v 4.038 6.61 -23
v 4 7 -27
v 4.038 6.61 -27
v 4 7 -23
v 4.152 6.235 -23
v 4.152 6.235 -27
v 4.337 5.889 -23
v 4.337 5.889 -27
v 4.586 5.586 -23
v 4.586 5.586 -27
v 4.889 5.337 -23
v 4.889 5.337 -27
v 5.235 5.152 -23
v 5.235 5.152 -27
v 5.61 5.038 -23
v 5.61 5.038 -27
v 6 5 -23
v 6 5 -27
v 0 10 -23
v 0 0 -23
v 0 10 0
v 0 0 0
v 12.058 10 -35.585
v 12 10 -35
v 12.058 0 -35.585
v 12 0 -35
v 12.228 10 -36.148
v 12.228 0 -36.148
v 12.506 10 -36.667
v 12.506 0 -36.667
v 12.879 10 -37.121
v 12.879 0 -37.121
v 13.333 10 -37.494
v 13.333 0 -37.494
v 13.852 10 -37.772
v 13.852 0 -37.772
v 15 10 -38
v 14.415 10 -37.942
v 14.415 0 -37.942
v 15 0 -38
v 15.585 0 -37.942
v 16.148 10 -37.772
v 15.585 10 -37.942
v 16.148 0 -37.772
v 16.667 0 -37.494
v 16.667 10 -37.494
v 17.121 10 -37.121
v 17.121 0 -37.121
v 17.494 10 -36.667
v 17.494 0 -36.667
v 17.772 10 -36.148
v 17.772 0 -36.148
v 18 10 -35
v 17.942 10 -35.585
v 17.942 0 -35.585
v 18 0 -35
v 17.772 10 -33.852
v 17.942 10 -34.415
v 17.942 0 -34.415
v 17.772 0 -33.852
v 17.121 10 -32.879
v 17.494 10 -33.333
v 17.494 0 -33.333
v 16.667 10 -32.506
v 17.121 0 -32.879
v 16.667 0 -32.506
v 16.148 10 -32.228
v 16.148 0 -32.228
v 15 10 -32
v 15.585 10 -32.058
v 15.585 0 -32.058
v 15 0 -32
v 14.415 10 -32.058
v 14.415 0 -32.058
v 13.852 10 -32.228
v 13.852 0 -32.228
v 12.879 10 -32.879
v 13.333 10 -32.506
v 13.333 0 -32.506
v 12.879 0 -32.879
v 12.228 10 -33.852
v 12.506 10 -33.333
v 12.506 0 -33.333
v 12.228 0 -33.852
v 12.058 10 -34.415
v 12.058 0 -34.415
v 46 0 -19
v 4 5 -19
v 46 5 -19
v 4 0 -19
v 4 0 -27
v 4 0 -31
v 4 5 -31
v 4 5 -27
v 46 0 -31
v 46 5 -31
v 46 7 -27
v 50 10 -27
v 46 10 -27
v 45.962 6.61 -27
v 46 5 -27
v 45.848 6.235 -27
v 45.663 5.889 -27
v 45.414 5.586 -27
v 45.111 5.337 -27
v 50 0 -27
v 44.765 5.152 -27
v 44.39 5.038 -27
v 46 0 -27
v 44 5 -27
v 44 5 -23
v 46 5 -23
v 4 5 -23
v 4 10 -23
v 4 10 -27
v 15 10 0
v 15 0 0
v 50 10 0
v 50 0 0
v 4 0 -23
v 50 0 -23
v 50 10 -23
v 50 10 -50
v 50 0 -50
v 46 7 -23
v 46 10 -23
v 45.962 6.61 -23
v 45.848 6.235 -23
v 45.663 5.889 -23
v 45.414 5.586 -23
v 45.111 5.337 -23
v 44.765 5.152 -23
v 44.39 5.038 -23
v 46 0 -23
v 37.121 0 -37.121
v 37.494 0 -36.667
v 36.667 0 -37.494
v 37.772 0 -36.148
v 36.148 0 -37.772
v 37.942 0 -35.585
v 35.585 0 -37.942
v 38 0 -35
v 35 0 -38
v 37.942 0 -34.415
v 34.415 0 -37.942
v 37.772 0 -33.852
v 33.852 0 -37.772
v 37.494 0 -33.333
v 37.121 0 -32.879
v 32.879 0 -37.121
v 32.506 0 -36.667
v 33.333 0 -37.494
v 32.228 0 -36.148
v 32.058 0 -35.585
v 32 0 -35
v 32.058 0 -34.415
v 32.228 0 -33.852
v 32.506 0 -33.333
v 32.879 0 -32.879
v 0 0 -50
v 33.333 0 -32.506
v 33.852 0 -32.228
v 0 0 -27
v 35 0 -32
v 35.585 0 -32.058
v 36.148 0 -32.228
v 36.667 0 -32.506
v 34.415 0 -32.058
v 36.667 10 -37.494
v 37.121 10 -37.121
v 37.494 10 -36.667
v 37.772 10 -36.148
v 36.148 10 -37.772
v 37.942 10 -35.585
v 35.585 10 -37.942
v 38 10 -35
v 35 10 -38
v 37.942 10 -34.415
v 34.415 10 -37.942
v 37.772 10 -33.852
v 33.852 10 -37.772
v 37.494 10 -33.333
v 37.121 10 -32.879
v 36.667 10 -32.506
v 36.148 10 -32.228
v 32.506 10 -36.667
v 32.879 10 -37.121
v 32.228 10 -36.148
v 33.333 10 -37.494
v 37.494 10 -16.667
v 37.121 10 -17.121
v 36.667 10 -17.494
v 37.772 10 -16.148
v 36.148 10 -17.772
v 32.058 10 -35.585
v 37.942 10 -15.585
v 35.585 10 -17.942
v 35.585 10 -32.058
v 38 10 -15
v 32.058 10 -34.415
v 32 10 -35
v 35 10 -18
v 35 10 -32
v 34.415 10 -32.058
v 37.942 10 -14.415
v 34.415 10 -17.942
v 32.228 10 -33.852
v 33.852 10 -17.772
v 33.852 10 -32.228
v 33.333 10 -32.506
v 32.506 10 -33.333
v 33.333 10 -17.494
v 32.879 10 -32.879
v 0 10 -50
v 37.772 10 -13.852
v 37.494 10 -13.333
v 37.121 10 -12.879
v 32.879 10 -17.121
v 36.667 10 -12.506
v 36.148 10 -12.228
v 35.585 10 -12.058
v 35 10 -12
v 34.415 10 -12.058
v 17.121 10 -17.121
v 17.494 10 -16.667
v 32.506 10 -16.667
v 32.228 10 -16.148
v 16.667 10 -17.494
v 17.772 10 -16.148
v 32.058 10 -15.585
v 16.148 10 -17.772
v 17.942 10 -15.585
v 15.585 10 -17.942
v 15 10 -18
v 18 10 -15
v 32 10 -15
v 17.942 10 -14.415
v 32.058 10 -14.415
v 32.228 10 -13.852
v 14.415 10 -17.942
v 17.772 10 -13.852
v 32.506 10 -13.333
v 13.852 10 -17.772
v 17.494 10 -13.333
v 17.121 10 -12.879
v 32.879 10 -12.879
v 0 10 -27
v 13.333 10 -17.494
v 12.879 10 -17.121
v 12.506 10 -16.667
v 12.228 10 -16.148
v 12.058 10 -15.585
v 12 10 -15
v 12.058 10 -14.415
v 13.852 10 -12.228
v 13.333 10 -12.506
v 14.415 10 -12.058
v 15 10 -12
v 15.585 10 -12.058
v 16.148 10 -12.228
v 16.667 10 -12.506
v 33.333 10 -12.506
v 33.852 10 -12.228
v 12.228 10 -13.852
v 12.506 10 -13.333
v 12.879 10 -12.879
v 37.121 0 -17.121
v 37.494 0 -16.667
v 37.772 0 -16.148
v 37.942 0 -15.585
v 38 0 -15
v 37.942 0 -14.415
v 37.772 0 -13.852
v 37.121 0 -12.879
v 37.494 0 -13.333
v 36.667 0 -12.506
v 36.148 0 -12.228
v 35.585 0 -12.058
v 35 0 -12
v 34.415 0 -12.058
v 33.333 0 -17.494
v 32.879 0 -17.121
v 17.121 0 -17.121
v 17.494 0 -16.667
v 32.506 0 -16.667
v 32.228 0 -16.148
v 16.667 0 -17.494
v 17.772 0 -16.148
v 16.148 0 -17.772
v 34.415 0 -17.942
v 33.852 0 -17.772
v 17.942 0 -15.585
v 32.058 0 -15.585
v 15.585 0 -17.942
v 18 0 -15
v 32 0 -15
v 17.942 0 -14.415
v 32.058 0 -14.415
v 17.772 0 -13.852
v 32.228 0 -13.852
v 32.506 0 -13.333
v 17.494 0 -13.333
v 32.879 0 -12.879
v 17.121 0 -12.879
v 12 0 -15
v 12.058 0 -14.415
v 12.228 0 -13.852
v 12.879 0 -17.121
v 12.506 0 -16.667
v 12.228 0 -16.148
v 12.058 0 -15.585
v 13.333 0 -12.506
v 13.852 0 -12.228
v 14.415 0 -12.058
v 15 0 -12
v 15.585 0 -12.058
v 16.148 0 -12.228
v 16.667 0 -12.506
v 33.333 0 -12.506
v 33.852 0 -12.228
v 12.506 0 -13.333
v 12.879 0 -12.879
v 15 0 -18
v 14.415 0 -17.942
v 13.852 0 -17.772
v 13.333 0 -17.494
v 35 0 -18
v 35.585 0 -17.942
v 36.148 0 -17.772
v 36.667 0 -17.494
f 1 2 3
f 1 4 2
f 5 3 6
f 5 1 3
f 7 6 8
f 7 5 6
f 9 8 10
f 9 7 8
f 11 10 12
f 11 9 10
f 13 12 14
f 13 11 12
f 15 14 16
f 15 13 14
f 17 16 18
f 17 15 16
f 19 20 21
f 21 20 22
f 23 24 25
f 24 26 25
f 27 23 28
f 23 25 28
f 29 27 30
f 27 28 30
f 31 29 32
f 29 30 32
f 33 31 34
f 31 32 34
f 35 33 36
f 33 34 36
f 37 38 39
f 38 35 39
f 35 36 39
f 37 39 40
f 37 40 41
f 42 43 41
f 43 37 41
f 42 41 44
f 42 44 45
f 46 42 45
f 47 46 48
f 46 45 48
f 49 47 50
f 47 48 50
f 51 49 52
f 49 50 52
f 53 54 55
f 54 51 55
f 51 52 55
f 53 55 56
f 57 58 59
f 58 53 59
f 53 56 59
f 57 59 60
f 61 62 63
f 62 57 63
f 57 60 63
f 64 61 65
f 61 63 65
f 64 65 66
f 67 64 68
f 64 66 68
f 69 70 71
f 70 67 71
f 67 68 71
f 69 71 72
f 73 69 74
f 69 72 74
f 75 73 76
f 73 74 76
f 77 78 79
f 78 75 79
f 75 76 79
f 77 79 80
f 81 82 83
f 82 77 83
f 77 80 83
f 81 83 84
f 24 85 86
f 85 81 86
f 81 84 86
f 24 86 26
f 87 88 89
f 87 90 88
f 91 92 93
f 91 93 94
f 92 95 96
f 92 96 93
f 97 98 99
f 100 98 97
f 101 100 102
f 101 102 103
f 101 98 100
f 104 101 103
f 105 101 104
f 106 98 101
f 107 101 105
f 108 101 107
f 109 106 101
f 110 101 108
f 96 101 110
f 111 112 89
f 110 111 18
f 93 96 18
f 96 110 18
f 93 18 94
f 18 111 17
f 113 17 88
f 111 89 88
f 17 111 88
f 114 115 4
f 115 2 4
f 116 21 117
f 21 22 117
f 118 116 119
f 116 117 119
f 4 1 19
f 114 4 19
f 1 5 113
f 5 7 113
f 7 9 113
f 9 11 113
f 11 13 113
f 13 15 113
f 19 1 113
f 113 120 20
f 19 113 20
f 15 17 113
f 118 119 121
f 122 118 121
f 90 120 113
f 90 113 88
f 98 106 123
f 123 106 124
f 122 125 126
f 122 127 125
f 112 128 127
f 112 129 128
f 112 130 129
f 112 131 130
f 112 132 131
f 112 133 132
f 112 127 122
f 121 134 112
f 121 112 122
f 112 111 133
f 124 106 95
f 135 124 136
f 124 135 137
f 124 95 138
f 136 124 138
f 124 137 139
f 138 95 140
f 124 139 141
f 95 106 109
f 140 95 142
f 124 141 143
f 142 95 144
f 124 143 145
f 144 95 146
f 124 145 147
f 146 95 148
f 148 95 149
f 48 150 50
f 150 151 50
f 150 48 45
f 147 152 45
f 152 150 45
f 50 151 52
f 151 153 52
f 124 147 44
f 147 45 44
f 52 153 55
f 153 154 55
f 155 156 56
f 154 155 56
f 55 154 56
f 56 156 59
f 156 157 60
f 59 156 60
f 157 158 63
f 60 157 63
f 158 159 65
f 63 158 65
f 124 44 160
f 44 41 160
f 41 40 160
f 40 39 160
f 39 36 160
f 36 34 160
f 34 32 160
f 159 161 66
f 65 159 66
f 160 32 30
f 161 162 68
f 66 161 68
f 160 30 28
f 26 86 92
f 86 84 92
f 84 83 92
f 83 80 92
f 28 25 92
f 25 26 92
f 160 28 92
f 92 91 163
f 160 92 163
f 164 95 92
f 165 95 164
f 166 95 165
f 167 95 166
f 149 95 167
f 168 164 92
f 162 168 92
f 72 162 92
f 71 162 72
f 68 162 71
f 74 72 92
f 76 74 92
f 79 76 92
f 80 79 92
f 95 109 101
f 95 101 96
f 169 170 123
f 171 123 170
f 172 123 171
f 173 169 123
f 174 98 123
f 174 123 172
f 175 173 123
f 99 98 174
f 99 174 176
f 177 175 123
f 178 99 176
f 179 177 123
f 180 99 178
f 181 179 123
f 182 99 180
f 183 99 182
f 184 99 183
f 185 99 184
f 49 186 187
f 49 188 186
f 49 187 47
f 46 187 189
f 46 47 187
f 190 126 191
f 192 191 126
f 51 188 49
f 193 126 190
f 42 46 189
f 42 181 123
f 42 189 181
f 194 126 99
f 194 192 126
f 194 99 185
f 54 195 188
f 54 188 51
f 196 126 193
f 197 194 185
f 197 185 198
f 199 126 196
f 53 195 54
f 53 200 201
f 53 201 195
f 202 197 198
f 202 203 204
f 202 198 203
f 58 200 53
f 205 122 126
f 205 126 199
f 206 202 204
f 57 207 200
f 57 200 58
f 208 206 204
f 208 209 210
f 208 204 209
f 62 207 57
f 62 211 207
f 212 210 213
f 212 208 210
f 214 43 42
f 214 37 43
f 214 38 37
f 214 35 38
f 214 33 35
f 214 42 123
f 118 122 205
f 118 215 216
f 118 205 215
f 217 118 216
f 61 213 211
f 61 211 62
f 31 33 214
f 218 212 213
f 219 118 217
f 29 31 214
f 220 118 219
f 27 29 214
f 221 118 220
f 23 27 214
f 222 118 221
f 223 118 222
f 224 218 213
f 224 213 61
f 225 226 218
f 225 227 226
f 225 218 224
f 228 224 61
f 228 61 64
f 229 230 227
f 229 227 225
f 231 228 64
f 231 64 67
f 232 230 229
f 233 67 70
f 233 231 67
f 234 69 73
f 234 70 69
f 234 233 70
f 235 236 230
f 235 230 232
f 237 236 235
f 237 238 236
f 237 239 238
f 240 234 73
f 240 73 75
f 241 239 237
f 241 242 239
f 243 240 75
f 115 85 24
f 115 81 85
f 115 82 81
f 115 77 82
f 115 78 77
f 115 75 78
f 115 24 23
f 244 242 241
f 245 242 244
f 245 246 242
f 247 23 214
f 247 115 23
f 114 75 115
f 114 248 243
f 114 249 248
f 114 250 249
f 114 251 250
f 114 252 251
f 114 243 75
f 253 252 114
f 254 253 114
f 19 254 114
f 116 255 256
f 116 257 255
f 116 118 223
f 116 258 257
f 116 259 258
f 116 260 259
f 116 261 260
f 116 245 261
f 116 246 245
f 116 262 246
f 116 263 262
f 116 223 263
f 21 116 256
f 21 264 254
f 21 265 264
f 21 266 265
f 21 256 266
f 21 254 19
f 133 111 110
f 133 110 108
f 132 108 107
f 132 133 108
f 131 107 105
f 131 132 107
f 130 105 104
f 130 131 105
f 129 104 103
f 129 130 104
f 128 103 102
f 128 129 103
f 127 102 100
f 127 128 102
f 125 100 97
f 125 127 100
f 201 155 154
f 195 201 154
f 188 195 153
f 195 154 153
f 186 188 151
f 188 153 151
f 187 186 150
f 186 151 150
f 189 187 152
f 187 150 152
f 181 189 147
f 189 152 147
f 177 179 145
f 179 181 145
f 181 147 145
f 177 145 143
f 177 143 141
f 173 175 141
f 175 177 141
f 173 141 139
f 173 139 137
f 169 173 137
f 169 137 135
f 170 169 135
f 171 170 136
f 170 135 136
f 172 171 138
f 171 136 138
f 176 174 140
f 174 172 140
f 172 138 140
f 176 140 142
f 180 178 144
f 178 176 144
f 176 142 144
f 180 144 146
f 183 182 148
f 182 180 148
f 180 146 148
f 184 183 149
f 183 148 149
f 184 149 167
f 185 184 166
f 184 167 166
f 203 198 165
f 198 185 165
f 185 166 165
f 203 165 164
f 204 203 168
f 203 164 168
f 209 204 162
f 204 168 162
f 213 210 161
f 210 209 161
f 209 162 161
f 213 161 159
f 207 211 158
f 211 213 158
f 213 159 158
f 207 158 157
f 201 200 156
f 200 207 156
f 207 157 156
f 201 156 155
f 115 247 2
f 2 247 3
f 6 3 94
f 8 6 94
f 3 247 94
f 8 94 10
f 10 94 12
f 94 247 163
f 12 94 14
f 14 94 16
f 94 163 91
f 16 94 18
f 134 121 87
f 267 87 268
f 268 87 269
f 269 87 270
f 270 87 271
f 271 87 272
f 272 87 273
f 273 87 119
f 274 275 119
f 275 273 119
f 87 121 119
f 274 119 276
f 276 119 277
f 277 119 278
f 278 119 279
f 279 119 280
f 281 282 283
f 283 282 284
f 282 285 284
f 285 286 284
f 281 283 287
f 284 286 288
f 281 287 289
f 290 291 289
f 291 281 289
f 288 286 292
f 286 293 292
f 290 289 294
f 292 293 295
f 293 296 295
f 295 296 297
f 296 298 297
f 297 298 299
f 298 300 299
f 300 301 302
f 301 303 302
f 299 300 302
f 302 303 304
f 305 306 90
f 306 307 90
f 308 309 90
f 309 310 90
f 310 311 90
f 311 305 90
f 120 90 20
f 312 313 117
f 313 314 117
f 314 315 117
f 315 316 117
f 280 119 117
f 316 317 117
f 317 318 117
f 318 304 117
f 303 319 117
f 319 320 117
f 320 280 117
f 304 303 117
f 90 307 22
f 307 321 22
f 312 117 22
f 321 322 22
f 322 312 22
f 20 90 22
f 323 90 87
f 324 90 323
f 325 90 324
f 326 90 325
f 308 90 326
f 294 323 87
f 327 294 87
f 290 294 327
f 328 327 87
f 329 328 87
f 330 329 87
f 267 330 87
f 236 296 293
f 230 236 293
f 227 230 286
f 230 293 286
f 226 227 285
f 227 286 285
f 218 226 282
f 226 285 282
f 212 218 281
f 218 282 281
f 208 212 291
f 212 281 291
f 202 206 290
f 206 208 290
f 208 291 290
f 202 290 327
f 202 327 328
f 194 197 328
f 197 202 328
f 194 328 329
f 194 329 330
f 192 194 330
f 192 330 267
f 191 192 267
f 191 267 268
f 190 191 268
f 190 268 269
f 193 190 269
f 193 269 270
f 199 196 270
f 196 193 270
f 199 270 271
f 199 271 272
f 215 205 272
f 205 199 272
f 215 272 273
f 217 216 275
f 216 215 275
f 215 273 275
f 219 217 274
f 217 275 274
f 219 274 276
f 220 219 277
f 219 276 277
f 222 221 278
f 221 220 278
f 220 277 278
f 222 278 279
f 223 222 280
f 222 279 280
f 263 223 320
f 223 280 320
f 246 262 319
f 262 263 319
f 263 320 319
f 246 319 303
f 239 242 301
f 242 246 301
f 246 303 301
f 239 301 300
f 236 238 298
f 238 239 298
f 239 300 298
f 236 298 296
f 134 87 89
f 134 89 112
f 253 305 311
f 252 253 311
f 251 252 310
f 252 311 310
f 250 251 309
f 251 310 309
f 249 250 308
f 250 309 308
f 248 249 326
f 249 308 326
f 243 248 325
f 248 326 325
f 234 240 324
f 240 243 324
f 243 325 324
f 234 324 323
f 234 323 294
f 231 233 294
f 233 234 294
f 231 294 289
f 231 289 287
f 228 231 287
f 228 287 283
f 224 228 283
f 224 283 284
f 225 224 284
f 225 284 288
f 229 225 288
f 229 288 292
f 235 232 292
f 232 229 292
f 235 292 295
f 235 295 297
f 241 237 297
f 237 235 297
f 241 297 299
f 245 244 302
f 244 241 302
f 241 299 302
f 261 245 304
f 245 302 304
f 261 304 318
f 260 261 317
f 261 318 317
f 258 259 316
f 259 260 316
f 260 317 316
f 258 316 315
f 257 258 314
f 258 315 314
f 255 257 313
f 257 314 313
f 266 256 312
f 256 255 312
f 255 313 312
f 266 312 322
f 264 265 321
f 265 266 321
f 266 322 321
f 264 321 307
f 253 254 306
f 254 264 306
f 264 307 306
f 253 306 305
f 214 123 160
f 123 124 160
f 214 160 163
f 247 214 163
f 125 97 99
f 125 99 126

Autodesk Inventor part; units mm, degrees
ref_plane "YZ Plane" through (0, 0, 0) normal (1, 0, 0) x (0, 1, 0)
ref_plane "XZ Plane" through (0, 0, 0) normal (0, 1, 0) x (-1, 0, 0)
ref_plane "XY Plane" through (0, 0, 0) normal (0, 0, 1) x (1, 0, 0)
sketch "Sketch2" plane through (0, 0, 0) normal (0, 1, 0) x (-1, 0, 0)
  line L0 (0, 0) -> (-50, 0)
  line L1 (-50, 0) -> (-50, -50)
  line L2 (-50, -50) -> (0, -50)
  line L3 (0, -50) -> (0, 0)
  circle A0 centre (-15, -35) radius 3
  circle A1 centre (-15, -15) radius 3
  line L4 (-15, -35) -> (-15, -50) construction
  line L5 (-15, -15) -> (-15, 0)
  line L6 (-15, -35) -> (0, -35) construction
  line L7 (0, -27) -> (-4, -27)
  line L8 (-4, -23) -> (0, -23)
  line L9 (0, -23) -> (0, -27)
  line L10 (-50, -27) -> (-46, -27)
  line L11 (-46, -23) -> (-50, -23)
  line L12 (-50, -23) -> (-50, -27)
  line L13 (-50, -30) -> (-50, -37)
  line L14 (0, -13) -> (0, -20)
  line L15 (-4, -23) -> (-4, -19)
  line L16 (-4, -19) -> (-46, -19)
  line L17 (-46, -19) -> (-46, -23)
  line L18 (-46, -27) -> (-46, -31)
  line L19 (-46, -31) -> (-4, -31)
  line L20 (-4, -31) -> (-4, -27)
  line L21 (-4, -27) -> (-4, -23)
  line L22 (-46, -27) -> (-46, -23)
  line L23 (-35, 0) -> (-35, -15) construction
  line L24 (-35, -50) -> (-35, -35) construction
  line L25 (-35, -15) -> (-50, -15) construction
  circle A2 centre (-35, -15) radius 3
  circle A3 centre (-35, -35) radius 3
  point P0 (0, -25)
  point P1 (-50, -25)
  point P2 (0, -23)
  dimension "d0" = 50
  dimension "d1" = 6
  dimension "d6" = 4
  dimension "d10" = 7
  dimension "d23" = 15
  dimension "d24" = 4
extrude "Extrusion1" add sketch "Sketch2" along normal blind 10 contours L3 L8 L15 L16 L17 L11 L1 L0 | L10 L18 L19 L20 L7 L3 L2 L1 | L17 L16 L15 L21 L20 L19 L18 L22
extrude "Extrusion2" cut sketch "Sketch2" along normal blind 5 contours L17 L16 L15 L21 L20 L19 L18 L22
fillet "Fillet1" radius 2 2 edges at (4, 5, -25) (46, 5, -25)
equation "\"d0\" = width"
equation "\"d1\" = hole_diameter"
equation "\"d6\" = cabel_shaft_size"
equation "\"d23\" = edge_to_hole"
equation "\"d24\" = cabel_shaft_size"
equation "\"d18\" = plate_thicknes"
equation "\"d20\" = 0.5 * plate_thicknes"
equation "\"width\" = inner_leg_width"
equation "\"cabel_channel_depth\" = 4"
equation "\"plate_thicknes\" = 10"
equation "\"hole_diameter\" = 6"
equation "\"cabel_shaft_size\" = 4"
equation "\"edge_to_hole\" = 15"
equation "\"inner_leg_width\" = 50"
properties part number "2_inner_leg_top_plate"
